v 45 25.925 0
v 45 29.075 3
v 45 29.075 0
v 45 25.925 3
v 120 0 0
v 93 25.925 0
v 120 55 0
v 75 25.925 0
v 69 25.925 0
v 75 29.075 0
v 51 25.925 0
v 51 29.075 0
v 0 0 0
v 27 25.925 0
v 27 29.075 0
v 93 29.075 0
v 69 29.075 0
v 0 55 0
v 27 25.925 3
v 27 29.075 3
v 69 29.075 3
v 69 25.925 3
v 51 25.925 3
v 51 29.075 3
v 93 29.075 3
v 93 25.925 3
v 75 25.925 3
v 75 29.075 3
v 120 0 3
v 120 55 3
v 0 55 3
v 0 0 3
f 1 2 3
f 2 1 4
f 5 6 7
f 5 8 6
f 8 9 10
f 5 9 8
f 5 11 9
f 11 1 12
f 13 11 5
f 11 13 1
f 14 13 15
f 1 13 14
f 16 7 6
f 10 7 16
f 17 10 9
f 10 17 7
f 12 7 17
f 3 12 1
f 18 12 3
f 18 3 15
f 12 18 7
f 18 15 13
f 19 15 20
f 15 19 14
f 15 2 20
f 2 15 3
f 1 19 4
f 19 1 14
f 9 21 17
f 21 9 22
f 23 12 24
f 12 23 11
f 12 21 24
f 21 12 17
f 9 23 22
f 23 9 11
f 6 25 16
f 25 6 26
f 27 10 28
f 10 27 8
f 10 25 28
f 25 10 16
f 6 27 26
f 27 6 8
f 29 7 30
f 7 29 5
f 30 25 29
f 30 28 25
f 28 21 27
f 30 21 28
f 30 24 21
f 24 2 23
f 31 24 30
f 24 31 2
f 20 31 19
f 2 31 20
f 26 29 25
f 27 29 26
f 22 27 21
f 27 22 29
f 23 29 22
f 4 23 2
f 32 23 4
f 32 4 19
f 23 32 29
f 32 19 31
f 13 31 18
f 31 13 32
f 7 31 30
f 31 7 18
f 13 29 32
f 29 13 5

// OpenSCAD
panel_w_mm = 120;
panel_h_mm = 55;
material_thickness_mm = 3.0;

kerf_mm = 0.2;
slot_count = 3;
slot_length_mm = 18;
slot_width_mm = 3.15;
min_web_mm = 6.0;

slot_pitch_mm = slot_length_mm + min_web_mm;
start_x_mm = (panel_w_mm - (slot_count * slot_length_mm + (slot_count - 1) * min_web_mm)) / 2;
slot_y_mm = (panel_h_mm - slot_width_mm) / 2;

echo("MAKERBENCH-LASER2D: {\"material_thickness_mm\": 3.0, \"kerf_mm\": 0.2, \"slot_count\": 3, \"slot_length_mm\": 18, \"slot_width_mm\": 3.15, \"min_web_mm\": 6.0}");

difference() {
    cube([panel_w_mm, panel_h_mm, material_thickness_mm], center = false);

    for (i = [0:slot_count - 1]) {
        translate([start_x_mm + i * slot_pitch_mm, slot_y_mm, 0]) {
            cube([slot_length_mm, slot_width_mm, material_thickness_mm + 0.1], center = false);
        }
    }
}
